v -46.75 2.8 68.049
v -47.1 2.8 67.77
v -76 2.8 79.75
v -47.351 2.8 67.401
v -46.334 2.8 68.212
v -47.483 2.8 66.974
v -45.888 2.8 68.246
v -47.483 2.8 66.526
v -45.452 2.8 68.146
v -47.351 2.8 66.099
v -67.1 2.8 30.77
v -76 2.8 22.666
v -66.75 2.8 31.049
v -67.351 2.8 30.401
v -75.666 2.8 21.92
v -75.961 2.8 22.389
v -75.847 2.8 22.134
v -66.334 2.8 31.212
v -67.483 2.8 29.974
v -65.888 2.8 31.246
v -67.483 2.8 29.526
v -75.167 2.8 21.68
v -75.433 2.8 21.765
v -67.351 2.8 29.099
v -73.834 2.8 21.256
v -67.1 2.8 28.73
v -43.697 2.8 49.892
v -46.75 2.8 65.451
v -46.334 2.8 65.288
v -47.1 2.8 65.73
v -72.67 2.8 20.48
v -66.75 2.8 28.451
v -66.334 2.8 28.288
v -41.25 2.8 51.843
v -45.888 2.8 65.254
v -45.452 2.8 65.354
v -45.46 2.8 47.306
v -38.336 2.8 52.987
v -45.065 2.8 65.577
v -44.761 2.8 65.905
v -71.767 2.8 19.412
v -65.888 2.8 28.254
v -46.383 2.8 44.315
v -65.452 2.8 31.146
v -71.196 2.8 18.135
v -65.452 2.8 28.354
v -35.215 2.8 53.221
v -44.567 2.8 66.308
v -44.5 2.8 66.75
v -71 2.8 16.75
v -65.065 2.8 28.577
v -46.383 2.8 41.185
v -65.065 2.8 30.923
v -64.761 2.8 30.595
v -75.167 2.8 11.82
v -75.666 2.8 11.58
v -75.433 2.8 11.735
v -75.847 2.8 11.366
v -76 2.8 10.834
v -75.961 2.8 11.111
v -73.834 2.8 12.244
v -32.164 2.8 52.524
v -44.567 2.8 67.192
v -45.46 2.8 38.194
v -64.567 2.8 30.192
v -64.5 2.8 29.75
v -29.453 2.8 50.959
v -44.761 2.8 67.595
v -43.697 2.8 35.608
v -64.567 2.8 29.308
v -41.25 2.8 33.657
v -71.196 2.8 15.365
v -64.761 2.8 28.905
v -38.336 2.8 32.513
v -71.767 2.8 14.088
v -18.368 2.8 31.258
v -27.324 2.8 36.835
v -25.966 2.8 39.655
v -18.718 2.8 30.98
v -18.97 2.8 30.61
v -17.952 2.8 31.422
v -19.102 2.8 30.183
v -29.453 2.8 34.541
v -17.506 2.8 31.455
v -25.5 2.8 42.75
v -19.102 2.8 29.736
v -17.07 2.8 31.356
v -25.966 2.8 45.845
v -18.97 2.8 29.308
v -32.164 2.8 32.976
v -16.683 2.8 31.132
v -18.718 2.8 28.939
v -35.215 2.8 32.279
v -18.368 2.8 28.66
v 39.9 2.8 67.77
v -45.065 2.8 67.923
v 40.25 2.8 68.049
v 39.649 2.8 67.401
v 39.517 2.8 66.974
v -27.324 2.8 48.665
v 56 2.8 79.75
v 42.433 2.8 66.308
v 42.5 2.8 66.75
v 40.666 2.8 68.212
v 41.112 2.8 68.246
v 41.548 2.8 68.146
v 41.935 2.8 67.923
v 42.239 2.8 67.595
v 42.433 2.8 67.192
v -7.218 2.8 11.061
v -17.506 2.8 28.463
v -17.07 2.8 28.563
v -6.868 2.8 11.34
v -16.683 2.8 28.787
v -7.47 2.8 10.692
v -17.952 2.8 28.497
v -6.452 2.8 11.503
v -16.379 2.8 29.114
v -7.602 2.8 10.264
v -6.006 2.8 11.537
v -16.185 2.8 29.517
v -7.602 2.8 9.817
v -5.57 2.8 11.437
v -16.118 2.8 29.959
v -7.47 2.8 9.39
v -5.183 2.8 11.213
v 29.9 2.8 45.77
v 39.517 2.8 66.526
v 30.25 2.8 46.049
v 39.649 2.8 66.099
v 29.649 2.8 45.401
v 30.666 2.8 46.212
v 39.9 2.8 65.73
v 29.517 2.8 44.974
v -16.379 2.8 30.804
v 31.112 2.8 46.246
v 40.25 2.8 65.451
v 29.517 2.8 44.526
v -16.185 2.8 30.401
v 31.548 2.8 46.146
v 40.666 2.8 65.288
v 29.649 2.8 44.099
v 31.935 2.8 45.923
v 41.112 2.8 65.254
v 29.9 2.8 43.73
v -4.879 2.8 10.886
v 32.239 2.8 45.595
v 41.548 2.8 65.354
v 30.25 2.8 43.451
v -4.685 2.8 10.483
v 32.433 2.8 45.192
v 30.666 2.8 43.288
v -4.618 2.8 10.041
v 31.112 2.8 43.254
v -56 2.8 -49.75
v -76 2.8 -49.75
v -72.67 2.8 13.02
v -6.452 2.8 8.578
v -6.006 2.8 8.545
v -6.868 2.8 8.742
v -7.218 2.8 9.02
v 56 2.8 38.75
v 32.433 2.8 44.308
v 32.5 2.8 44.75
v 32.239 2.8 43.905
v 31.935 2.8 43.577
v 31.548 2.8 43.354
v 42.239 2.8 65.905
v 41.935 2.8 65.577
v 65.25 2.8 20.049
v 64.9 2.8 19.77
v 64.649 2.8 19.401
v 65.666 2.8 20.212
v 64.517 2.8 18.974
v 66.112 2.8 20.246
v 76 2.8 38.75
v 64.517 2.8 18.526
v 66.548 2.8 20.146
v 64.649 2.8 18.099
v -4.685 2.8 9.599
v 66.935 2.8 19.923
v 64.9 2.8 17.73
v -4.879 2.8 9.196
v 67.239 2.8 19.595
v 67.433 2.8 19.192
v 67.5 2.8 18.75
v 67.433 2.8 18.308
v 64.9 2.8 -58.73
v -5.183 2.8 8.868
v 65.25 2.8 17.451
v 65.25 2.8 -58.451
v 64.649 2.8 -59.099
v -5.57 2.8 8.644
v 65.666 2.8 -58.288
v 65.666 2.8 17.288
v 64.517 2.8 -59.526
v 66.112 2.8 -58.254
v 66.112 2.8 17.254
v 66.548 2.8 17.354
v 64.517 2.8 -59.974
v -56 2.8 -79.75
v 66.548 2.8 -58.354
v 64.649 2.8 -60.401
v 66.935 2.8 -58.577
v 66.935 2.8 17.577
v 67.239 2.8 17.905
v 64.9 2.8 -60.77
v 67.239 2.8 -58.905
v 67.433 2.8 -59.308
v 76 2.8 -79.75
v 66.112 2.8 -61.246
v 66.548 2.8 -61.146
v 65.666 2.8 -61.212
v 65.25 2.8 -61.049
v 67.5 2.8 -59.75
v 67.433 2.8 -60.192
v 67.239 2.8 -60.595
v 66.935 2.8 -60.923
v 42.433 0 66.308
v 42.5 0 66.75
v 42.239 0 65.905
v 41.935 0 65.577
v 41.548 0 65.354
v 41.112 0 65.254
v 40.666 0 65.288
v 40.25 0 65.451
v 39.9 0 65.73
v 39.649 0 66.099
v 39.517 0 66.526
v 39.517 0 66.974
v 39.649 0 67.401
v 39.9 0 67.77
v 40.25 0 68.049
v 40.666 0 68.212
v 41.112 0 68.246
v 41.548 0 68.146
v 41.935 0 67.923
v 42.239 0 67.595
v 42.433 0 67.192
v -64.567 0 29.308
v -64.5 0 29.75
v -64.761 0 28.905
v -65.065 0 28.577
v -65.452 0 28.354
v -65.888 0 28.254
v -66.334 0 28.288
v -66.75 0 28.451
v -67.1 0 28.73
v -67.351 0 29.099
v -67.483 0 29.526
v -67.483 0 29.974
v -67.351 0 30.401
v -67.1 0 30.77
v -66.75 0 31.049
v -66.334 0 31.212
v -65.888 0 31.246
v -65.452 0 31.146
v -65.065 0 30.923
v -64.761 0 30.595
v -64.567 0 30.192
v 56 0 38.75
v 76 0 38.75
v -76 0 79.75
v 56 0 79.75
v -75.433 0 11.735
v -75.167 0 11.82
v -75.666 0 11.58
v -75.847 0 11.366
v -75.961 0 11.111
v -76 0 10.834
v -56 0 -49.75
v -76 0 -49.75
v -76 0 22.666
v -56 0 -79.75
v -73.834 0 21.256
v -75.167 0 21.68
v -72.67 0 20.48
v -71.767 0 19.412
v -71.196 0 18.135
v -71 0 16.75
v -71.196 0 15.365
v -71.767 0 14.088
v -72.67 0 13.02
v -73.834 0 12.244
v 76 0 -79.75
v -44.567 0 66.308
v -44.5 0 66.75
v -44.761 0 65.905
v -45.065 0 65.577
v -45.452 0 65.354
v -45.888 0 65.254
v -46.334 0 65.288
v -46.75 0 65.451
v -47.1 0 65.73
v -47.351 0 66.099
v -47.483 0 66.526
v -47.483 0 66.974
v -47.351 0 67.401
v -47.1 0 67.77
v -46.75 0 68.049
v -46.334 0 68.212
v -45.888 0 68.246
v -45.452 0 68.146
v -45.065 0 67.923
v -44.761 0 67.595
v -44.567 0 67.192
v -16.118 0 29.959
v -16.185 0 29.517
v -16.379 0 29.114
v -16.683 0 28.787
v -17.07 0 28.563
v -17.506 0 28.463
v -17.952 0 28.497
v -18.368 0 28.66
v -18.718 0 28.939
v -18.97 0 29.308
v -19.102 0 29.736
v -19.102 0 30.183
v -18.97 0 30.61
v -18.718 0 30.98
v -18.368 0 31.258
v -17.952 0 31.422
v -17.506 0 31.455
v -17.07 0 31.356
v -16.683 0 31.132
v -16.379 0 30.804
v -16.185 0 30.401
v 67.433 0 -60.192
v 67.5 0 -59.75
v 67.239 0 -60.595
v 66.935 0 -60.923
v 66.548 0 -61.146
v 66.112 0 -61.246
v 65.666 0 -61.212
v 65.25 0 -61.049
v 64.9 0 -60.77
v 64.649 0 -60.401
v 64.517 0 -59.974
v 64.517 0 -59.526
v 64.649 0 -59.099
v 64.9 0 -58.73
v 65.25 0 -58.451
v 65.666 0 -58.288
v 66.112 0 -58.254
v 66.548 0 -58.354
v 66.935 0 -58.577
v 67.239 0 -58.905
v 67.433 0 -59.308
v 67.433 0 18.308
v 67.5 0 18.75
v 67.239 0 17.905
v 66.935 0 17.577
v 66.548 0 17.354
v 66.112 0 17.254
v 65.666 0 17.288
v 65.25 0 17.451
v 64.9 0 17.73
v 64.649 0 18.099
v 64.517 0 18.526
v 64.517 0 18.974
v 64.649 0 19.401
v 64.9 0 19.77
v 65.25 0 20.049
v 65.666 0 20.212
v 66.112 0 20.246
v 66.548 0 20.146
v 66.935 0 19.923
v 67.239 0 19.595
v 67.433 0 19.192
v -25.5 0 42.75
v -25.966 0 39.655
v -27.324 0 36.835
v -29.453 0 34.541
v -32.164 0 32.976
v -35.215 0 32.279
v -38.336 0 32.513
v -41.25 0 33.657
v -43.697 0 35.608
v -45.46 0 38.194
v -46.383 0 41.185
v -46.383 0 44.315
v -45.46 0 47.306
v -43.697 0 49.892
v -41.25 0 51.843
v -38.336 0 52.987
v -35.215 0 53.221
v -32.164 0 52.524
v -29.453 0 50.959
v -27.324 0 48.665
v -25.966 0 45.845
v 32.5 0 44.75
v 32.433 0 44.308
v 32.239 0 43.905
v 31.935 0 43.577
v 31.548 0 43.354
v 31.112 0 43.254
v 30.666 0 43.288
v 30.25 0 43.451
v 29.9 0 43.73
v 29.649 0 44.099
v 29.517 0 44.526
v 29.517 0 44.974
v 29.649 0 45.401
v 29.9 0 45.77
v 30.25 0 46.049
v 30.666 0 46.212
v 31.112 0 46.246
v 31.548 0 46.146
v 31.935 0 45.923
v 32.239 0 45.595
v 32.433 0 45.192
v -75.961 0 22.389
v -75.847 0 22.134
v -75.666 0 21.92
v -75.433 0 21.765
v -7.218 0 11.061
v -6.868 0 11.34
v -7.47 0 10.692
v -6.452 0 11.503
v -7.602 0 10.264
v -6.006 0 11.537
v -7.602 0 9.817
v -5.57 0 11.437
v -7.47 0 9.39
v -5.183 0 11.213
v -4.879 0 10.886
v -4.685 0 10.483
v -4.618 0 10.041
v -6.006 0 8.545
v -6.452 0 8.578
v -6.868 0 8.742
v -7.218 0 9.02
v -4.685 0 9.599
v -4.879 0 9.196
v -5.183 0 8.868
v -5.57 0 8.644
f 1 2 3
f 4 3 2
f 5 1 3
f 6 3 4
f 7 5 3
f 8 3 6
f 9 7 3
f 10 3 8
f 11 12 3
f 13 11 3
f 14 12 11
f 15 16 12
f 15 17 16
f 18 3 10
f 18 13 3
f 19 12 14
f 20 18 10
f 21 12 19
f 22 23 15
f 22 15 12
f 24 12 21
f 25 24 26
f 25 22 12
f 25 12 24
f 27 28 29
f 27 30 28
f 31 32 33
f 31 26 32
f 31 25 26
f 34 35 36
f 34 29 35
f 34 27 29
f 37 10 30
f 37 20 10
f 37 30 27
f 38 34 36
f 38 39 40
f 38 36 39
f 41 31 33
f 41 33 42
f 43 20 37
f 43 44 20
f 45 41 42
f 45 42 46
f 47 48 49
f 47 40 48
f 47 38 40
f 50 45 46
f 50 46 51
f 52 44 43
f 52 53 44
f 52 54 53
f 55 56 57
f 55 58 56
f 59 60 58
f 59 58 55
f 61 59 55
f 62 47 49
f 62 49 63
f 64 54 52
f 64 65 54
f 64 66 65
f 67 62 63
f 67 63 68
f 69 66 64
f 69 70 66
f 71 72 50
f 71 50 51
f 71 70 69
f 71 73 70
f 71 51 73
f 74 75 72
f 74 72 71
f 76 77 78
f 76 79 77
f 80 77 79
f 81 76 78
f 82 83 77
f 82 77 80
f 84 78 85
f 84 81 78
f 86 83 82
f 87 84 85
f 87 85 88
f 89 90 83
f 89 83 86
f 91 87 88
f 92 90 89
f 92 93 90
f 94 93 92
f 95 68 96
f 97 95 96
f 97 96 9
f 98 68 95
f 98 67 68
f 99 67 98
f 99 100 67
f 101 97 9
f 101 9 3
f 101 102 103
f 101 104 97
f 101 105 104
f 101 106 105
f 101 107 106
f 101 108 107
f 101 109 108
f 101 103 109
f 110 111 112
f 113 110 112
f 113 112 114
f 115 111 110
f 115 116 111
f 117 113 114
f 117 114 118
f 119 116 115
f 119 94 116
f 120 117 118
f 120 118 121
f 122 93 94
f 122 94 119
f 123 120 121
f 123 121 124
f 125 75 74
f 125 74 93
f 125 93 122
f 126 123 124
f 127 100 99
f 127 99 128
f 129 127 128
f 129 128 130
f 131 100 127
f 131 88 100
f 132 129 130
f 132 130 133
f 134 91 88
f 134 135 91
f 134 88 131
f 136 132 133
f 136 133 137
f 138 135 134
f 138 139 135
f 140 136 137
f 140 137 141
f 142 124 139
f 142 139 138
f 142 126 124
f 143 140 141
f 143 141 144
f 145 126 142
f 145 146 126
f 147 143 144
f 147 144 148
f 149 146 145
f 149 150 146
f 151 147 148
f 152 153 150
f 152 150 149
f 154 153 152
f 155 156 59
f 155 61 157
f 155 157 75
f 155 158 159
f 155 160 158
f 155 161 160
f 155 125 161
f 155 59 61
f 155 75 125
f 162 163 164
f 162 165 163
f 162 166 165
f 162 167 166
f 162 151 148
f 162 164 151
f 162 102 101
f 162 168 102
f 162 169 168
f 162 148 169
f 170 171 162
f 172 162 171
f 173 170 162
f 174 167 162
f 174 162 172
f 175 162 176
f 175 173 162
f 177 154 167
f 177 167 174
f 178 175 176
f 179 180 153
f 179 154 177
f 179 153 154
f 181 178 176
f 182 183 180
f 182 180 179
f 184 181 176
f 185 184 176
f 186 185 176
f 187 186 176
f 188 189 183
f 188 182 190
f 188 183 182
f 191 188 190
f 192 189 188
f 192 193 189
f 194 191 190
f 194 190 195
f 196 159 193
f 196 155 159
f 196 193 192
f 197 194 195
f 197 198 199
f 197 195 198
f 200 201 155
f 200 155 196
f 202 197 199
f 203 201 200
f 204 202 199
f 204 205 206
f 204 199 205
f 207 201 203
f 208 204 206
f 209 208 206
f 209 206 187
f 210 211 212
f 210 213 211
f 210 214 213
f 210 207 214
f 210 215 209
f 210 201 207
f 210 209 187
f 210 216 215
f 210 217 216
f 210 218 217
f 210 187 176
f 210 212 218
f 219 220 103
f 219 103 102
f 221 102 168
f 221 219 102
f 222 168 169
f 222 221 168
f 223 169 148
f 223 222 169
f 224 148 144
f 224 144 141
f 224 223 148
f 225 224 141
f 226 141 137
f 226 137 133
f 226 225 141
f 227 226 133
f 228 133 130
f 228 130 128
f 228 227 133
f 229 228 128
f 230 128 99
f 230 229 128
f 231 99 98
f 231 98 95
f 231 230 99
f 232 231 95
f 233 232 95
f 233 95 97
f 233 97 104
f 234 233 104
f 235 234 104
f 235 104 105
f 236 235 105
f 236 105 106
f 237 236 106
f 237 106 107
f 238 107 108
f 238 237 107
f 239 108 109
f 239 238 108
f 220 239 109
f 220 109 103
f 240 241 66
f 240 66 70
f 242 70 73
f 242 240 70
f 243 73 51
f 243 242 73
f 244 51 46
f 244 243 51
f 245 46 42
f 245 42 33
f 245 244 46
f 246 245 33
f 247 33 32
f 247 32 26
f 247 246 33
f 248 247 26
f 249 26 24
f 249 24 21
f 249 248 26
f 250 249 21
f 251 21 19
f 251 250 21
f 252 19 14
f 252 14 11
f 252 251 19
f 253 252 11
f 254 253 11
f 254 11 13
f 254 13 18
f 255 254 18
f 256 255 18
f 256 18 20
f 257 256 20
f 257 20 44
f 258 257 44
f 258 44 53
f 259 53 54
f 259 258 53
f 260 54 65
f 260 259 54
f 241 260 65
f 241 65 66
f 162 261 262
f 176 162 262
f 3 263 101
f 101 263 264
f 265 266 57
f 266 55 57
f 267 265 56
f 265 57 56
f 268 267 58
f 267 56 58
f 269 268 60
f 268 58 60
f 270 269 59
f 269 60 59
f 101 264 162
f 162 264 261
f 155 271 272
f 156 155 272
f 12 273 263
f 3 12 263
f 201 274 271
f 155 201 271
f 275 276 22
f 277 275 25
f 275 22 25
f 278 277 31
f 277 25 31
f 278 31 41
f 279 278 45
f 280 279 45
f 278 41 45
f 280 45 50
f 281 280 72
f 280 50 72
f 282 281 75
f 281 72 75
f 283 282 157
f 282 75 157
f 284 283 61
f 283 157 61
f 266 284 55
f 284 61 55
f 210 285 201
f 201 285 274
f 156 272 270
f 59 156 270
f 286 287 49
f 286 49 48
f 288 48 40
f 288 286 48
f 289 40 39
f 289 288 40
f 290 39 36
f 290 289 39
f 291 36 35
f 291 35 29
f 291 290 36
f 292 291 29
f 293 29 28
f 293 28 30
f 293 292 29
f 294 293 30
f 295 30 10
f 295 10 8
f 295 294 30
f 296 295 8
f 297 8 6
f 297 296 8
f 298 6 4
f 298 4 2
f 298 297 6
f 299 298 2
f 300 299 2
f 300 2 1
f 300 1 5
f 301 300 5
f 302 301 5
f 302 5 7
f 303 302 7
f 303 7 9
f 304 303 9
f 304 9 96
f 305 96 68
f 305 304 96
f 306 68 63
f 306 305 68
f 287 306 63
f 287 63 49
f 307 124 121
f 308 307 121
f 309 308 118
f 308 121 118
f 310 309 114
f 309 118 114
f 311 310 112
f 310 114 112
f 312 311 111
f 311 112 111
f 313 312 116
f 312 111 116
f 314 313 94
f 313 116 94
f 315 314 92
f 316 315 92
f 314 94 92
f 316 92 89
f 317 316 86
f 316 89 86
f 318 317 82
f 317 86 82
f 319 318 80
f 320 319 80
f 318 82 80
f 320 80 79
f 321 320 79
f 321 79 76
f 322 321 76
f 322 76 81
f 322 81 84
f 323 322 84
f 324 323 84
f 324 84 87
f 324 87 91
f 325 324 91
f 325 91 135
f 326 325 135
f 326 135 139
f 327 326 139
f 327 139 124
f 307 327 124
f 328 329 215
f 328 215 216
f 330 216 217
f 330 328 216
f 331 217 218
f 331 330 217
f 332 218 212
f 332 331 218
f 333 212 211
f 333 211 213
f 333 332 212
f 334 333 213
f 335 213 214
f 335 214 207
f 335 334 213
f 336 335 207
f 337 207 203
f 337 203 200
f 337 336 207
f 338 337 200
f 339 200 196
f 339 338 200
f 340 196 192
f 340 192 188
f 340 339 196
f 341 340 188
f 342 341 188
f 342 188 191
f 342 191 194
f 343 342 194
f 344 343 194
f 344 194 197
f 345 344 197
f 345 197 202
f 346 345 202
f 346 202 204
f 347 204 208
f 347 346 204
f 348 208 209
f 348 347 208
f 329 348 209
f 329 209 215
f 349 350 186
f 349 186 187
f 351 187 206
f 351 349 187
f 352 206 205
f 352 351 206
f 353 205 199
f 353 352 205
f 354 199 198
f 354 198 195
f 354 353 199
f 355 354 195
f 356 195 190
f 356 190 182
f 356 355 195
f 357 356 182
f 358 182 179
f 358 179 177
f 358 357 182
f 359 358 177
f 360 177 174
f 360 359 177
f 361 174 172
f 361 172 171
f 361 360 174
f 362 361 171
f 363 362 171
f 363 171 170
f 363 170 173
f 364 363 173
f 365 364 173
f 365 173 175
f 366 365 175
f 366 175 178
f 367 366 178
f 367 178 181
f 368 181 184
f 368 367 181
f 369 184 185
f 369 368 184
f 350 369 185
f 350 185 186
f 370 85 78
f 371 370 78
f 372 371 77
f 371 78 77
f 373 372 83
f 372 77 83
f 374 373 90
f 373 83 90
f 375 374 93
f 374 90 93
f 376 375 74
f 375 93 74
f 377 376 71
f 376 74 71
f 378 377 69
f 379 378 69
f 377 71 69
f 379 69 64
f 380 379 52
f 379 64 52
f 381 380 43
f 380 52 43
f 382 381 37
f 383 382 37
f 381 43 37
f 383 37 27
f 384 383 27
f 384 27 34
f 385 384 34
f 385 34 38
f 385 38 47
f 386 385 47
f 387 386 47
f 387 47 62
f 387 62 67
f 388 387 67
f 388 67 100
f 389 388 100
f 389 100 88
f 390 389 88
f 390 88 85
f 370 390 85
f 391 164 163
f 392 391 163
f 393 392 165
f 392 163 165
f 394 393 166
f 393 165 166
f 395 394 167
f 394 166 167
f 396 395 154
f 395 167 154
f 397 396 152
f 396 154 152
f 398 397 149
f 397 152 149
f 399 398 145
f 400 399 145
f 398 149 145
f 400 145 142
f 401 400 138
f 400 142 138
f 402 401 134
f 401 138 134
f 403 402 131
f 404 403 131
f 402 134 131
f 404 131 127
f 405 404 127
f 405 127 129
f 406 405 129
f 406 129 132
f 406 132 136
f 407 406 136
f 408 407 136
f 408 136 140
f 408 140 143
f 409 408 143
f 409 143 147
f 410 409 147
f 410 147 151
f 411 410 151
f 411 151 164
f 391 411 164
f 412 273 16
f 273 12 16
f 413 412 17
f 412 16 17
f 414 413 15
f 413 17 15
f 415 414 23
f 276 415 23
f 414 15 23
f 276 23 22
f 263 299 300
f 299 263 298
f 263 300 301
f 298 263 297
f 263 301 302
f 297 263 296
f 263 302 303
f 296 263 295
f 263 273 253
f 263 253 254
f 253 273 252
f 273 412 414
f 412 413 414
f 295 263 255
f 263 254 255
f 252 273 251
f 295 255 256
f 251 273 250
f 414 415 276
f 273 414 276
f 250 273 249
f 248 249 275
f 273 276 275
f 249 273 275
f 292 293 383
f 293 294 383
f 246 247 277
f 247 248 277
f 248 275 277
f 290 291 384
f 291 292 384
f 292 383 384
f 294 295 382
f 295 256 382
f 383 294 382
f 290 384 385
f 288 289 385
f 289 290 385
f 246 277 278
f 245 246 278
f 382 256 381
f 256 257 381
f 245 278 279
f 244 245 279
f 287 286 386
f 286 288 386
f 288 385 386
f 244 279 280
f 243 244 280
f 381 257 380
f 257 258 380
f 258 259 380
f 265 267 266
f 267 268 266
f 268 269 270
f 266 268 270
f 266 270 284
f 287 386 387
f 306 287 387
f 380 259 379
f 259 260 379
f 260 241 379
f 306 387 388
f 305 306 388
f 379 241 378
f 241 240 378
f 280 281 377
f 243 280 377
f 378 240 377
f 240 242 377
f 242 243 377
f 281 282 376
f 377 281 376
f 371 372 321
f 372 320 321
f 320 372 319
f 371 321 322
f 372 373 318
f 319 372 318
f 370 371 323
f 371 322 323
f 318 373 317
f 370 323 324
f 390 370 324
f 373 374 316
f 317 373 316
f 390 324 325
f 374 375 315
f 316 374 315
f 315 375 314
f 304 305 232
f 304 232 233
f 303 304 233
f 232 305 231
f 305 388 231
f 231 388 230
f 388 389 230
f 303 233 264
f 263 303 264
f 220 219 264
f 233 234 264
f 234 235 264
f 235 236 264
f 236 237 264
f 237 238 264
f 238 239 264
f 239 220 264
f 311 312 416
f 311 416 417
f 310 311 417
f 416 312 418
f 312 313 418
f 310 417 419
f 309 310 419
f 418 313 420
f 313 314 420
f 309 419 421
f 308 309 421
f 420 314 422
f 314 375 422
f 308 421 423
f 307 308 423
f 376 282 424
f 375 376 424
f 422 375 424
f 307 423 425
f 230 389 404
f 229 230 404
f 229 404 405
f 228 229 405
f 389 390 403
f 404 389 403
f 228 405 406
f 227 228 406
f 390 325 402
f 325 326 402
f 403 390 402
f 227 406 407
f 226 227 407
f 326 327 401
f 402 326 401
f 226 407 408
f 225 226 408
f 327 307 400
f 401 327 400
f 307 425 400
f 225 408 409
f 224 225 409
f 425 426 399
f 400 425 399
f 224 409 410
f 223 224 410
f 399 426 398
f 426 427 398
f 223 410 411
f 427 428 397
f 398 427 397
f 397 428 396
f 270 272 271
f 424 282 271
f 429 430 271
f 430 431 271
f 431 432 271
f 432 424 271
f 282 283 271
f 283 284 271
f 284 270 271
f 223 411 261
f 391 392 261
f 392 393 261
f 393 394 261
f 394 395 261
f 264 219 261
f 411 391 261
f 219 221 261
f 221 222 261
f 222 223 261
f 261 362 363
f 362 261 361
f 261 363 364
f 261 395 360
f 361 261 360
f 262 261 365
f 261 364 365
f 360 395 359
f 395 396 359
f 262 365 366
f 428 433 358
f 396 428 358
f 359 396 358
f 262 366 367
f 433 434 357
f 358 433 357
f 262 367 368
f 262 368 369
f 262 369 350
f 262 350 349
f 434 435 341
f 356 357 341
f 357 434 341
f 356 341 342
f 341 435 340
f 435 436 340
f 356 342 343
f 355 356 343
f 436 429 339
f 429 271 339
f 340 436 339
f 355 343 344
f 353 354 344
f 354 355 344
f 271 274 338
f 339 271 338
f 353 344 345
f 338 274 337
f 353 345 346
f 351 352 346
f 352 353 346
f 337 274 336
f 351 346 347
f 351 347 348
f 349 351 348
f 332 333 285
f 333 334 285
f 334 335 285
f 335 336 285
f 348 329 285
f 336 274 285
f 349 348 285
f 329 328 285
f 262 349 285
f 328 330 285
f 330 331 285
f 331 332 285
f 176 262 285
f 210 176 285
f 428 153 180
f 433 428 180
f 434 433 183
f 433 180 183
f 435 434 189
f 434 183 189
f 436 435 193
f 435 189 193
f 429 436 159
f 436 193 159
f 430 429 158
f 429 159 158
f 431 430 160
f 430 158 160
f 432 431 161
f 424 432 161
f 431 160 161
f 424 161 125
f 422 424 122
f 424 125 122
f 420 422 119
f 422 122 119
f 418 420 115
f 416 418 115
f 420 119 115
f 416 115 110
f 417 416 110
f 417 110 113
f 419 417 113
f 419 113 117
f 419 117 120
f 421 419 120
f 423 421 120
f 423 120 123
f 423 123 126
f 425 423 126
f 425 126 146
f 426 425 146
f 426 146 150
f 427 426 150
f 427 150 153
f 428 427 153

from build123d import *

# Parameters (mm, degrees)
SKETCH1_R           = 1.5
BOSS_EXTRUDE1_DEPTH = 2.8
CUT_EXTRUDE1_REACH  = 4.8
SKETCH2_R           = 1.5
CUT_EXTRUDE2_REACH  = 4.8
SKETCH3_R           = 10.5
CUT_EXTRUDE3_REACH  = 4.8
SKETCH4_R           = 5
FILLET1_R           = 1


with BuildPart() as part:
    # Sketch1 → Boss-Extrude1 (new body)
    with BuildSketch(Plane(origin=(0, 0, 0), x_dir=(1, 0, 0), z_dir=(0, 1, 0))):
        Polygon((-76, -79.75), (56, -79.75), (56, -38.75), (76, -38.75), (76, 79.75), (-56, 79.75), (-56, 49.75), (-76, 49.75), align=None)
        with Locations((-46, -66.75)):
            Circle(SKETCH1_R, mode=Mode.SUBTRACT)
        with Locations((-66, -29.75)):
            Circle(SKETCH1_R, mode=Mode.SUBTRACT)
        with Locations((41, -66.75)):
            Circle(SKETCH1_R, mode=Mode.SUBTRACT)
        with Locations((66, -18.75)):
            Circle(SKETCH1_R, mode=Mode.SUBTRACT)
        with Locations((66, 59.75)):
            Circle(SKETCH1_R, mode=Mode.SUBTRACT)
    extrude(amount=BOSS_EXTRUDE1_DEPTH)

    # Sketch2 → Cut-Extrude1 (cut, up to next)
    with BuildSketch(Plane(origin=(0, 2.8, 0), x_dir=(1, 0, 0), z_dir=(0, 1, 0)), mode=Mode.PRIVATE) as cut_extrude1_sk1:
        with Locations((31, -44.75)):
            Circle(SKETCH2_R)
    cut_extrude1_tool1 = extrude(cut_extrude1_sk1.sketch, amount=-CUT_EXTRUDE1_REACH, mode=Mode.PRIVATE) & part.part
    add(cut_extrude1_tool1.solids().sort_by_distance((31, 2.8, 44.75))[0], mode=Mode.SUBTRACT)
    # Sketch2 → Cut-Extrude1 (cut, up to next)
    with BuildSketch(Plane(origin=(0, 2.8, 0), x_dir=(1, 0, 0), z_dir=(0, 1, 0)), mode=Mode.PRIVATE) as cut_extrude1_sk2:
        with Locations((-6.118257487, -10.040707856)):
            Circle(SKETCH2_R)
    cut_extrude1_tool2 = extrude(cut_extrude1_sk2.sketch, amount=-CUT_EXTRUDE1_REACH, mode=Mode.PRIVATE) & part.part
    add(cut_extrude1_tool2.solids().sort_by_distance((-6.118257, 2.8, 10.040708))[0], mode=Mode.SUBTRACT)
    # Sketch2 → Cut-Extrude1 (cut, up to next)
    with BuildSketch(Plane(origin=(0, 2.8, 0), x_dir=(1, 0, 0), z_dir=(0, 1, 0)), mode=Mode.PRIVATE) as cut_extrude1_sk3:
        with Locations((-17.618257487, -29.959292144)):
            Circle(SKETCH2_R)
    cut_extrude1_tool3 = extrude(cut_extrude1_sk3.sketch, amount=-CUT_EXTRUDE1_REACH, mode=Mode.PRIVATE) & part.part
    add(cut_extrude1_tool3.solids().sort_by_distance((-17.618257, 2.8, 29.959292))[0], mode=Mode.SUBTRACT)

    # Sketch3 → Cut-Extrude2 (cut, up to next)
    with BuildSketch(Plane(origin=(0, 2.8, 0), x_dir=(1, 0, 0), z_dir=(0, 1, 0)), mode=Mode.PRIVATE) as cut_extrude2_sk1:
        with Locations((-36, -42.75)):
            Circle(SKETCH3_R)
    cut_extrude2_tool1 = extrude(cut_extrude2_sk1.sketch, amount=-CUT_EXTRUDE2_REACH, mode=Mode.PRIVATE) & part.part
    add(cut_extrude2_tool1.solids().sort_by_distance((-36, 2.8, 42.75))[0], mode=Mode.SUBTRACT)

    # Sketch4 → Cut-Extrude3 (cut, up to next)
    with BuildSketch(Plane(origin=(0, 2.8, 0), x_dir=(1, 0, 0), z_dir=(0, 1, 0)), mode=Mode.PRIVATE) as cut_extrude3_sk1:
        with Locations((-76, -16.75)):
            Circle(SKETCH4_R)
    cut_extrude3_tool1 = extrude(cut_extrude3_sk1.sketch, amount=-CUT_EXTRUDE3_REACH, mode=Mode.PRIVATE) & part.part
    add(cut_extrude3_tool1.solids().sort_by_distance((-76, 2.8, 16.75))[0], mode=Mode.SUBTRACT)

    # Fillet1
    fillet1_edges = [part.edges().sort_by_distance(p)[0] for p in [
        (-76, 1.4, 21.75),
        (-76, 1.4, 11.75),
    ]]
    fillet(fillet1_edges, radius=FILLET1_R)


solid = part.part
